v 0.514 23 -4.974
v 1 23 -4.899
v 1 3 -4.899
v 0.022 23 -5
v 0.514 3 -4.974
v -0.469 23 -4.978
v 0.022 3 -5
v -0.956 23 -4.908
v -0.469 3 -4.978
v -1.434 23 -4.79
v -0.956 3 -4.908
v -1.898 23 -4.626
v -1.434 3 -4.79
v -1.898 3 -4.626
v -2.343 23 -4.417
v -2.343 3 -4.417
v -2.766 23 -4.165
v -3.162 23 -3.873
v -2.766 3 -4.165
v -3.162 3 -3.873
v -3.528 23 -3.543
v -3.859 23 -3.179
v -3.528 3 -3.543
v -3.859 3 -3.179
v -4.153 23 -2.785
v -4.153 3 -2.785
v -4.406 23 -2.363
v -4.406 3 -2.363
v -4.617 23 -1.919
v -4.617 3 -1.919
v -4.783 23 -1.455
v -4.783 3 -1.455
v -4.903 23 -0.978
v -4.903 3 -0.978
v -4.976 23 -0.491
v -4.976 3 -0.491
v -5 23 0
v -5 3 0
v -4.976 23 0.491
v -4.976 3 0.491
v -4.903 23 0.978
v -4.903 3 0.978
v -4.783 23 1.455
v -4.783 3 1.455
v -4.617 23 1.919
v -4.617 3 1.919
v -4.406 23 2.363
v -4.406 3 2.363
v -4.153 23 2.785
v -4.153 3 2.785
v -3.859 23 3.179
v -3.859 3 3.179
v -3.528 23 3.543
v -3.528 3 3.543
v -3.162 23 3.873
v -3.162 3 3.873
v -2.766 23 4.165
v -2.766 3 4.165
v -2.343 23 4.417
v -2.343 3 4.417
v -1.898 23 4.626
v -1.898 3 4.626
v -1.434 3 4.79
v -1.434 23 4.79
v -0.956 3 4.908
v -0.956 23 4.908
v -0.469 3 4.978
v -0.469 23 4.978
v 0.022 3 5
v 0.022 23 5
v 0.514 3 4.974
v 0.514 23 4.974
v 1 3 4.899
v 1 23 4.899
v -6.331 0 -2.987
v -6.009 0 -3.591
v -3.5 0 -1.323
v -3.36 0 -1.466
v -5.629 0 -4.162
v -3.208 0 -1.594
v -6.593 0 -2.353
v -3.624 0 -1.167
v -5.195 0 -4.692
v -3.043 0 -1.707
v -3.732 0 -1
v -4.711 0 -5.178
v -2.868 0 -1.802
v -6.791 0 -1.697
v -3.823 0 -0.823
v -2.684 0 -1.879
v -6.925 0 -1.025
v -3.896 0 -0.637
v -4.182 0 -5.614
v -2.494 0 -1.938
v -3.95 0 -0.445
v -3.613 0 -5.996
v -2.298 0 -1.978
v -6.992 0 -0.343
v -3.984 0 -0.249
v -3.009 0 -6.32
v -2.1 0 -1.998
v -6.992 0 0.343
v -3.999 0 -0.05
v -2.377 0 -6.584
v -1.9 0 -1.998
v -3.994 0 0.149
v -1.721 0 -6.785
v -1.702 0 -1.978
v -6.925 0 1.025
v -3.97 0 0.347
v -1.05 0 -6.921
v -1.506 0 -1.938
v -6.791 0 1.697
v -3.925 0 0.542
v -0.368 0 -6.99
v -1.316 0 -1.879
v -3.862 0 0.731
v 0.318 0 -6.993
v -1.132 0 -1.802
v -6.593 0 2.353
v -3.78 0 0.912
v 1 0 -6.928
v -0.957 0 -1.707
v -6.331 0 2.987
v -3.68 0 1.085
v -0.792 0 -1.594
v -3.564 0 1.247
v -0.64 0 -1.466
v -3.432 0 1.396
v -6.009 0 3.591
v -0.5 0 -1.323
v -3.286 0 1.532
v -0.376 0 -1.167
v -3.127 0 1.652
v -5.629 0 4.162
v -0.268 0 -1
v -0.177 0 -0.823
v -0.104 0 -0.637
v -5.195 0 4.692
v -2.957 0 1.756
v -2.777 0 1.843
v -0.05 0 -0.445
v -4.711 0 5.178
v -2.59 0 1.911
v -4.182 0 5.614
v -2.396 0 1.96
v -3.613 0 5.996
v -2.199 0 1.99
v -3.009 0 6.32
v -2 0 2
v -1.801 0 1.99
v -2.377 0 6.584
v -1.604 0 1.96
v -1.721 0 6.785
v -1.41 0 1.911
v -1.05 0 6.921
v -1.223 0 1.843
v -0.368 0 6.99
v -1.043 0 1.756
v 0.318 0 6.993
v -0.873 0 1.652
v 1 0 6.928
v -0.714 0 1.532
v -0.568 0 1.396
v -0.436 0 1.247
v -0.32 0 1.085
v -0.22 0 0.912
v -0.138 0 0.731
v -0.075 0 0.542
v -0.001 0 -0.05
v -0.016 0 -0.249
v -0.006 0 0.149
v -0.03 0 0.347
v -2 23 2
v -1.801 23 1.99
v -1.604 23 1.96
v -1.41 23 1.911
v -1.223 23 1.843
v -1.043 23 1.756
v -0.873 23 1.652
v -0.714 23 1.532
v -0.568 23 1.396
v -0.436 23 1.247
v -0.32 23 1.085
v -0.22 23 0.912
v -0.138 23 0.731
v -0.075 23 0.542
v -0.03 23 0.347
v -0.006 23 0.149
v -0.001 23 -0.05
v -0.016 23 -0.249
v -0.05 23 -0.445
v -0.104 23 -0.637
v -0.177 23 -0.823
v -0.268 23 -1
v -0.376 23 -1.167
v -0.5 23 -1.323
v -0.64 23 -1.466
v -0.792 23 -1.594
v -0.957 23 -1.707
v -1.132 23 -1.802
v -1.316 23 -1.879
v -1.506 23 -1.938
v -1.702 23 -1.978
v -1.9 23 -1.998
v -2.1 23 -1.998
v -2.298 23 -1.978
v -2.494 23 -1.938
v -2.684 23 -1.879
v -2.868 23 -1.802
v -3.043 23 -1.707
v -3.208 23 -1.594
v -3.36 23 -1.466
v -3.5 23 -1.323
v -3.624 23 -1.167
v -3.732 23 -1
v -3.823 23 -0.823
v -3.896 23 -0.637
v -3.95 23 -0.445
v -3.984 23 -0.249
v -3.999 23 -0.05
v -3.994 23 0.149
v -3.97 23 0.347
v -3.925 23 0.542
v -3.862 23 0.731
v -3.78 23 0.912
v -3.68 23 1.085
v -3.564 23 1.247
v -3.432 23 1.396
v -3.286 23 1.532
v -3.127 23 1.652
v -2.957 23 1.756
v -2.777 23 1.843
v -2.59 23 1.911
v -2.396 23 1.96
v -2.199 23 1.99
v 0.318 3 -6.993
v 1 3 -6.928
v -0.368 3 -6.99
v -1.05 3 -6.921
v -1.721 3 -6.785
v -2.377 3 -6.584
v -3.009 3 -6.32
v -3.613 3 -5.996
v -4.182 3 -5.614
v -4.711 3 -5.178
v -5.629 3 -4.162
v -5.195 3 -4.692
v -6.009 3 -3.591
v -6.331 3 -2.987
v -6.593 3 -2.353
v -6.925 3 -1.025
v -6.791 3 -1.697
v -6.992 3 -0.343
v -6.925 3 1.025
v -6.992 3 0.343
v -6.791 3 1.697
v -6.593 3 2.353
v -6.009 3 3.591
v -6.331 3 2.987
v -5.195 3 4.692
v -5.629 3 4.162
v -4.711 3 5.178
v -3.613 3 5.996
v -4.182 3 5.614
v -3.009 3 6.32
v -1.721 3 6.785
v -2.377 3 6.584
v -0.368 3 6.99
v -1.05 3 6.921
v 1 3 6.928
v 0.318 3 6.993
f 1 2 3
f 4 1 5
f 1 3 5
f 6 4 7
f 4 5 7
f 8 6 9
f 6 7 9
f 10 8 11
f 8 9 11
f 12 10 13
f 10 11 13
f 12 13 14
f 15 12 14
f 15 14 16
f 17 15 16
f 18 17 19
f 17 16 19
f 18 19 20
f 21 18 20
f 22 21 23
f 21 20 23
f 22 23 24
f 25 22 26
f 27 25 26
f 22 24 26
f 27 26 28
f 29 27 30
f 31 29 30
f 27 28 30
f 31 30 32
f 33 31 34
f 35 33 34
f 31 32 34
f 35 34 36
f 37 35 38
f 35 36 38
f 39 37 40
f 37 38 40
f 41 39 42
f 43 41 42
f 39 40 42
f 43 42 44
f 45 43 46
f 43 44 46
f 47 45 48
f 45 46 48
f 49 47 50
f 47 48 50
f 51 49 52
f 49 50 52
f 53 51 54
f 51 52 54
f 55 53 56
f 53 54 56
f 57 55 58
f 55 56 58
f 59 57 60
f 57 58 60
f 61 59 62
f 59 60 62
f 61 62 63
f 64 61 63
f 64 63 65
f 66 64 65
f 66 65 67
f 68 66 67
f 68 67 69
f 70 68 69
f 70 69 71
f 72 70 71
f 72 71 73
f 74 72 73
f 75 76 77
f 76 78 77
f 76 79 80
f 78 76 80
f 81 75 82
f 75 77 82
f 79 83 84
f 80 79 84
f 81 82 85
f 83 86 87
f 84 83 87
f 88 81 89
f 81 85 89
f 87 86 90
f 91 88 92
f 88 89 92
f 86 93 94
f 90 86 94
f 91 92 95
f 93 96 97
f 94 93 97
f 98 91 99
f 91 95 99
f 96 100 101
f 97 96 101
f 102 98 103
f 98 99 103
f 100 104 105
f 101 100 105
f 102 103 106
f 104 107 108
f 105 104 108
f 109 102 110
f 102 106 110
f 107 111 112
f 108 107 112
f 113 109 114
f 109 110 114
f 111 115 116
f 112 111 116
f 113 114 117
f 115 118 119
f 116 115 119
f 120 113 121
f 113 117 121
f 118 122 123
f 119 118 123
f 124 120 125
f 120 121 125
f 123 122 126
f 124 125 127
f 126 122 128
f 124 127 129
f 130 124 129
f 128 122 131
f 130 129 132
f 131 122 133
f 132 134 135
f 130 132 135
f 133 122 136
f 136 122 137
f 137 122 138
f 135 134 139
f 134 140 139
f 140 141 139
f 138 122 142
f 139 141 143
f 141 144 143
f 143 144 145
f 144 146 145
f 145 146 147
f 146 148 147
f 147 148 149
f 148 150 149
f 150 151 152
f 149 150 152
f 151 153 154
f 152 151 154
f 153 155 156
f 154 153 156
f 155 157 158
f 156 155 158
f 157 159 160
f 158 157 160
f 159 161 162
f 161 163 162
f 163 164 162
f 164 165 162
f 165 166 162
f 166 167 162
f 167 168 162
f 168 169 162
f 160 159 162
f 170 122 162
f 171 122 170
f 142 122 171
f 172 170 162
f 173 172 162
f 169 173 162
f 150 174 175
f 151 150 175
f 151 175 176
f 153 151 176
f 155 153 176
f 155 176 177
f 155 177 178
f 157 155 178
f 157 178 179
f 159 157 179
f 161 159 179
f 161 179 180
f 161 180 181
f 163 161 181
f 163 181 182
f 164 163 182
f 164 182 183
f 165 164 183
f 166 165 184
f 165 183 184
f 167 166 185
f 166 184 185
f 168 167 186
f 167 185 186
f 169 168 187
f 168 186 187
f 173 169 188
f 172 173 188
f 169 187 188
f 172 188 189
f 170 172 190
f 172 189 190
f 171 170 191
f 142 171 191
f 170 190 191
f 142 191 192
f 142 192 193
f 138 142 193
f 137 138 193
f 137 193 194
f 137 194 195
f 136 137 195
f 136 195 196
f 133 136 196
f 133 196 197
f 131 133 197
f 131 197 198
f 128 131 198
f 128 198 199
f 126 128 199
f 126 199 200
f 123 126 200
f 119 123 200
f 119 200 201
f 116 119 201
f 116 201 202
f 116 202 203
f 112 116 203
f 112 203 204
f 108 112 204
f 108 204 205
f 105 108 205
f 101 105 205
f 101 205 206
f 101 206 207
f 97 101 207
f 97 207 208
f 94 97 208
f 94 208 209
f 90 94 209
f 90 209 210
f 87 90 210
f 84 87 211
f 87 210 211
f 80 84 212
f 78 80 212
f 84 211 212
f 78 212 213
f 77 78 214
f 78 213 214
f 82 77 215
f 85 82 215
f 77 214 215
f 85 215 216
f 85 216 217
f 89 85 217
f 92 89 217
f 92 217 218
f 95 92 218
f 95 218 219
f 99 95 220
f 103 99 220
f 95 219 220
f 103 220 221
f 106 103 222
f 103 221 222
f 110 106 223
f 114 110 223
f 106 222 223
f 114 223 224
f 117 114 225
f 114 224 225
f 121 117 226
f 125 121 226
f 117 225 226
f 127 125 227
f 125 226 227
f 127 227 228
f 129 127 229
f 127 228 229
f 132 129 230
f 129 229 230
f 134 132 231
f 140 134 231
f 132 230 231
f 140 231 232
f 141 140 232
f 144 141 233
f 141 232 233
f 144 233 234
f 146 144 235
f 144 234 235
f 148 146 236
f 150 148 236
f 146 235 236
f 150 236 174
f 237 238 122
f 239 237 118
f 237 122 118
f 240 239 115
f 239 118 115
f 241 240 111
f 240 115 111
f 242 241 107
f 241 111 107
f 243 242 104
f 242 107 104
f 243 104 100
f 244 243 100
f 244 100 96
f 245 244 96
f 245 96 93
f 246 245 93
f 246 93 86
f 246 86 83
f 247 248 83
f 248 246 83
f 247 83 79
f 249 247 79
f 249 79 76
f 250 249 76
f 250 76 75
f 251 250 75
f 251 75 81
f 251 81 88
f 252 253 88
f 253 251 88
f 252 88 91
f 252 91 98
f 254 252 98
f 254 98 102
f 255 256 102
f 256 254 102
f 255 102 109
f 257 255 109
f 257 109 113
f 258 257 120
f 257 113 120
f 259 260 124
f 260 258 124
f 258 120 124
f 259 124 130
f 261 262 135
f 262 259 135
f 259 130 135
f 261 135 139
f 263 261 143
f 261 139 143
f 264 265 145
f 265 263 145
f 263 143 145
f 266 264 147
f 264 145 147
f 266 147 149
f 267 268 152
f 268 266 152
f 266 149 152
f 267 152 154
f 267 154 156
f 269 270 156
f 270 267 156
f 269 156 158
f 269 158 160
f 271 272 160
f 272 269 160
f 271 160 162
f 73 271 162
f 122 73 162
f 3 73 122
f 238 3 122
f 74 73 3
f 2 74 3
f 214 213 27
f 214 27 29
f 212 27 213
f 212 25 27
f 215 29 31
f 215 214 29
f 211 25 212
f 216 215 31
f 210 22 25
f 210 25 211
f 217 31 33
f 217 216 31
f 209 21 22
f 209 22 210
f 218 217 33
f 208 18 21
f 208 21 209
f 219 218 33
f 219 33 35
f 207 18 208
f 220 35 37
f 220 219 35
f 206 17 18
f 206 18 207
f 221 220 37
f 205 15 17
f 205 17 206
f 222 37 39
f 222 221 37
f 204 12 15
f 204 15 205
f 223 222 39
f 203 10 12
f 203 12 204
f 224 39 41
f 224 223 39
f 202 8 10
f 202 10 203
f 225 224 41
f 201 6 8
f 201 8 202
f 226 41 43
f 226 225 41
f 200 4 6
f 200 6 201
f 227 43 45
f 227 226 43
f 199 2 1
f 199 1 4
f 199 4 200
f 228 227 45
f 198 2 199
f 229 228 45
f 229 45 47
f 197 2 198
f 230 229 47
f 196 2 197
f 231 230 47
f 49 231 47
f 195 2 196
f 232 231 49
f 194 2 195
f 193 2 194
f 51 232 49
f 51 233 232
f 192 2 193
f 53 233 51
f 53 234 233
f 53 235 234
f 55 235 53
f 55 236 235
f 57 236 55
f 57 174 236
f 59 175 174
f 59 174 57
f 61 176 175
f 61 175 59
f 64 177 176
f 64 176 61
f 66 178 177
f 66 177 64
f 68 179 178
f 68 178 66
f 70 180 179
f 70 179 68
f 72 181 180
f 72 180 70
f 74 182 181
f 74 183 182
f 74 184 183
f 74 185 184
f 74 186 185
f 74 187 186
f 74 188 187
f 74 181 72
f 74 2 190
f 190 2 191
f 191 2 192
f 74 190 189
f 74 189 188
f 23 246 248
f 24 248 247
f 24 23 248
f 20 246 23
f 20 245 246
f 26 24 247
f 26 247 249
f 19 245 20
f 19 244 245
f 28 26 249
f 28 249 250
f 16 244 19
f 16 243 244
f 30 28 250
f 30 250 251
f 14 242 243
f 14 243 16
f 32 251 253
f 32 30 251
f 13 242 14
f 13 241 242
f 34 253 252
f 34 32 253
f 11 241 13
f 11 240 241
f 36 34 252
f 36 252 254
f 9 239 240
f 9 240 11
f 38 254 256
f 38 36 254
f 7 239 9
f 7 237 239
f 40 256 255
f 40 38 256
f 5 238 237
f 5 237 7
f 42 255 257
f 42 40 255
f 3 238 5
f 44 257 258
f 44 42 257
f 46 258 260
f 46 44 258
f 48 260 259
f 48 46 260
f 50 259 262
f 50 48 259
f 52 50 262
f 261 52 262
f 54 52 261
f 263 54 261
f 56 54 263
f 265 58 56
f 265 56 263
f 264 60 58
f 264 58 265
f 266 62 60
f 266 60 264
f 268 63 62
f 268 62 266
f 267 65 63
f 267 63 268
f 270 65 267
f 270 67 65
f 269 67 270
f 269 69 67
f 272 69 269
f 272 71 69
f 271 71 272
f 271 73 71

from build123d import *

# Parameters (mm, degrees)
SKETCH_1_R          = 7
EXTRUDE_1_DEPTH     = 3
SKETCH_2_R          = 5
EXTRUDE_2_DEPTH     = 20
SKETCH_3_R          = 2
CUT_EXTRUDE_1_DEPTH = 26.039968051
SKETCH_4_W          = 8.616079813
SKETCH_4_H          = 14.040723598
CUT_EXTRUDE_2_DEPTH = 26.039968051


with BuildPart() as part:
    # 草图1 → 凸台-拉伸1 (new body)
    with BuildSketch(Plane(origin=(0, 0, 0), x_dir=(1, 0, 0), z_dir=(0, 1, 0))):
        with Locations(Location((0, 0, 0), (0, 0, 270))):
            Circle(SKETCH_1_R)
    extrude(amount=EXTRUDE_1_DEPTH)

    # 草图2 → 凸台-拉伸2 (add)
    with BuildSketch(Plane(origin=(0, 3, 0), x_dir=(1, 0, 0), z_dir=(0, 1, 0))):
        with Locations(Location((0, 0, 0), (0, 0, 270))):
            Circle(SKETCH_2_R)
    extrude(amount=EXTRUDE_2_DEPTH)

    # 草图3 → 切除-拉伸1 (cut, through all)
    with BuildSketch(Plane(origin=(0, 23, 0), x_dir=(1, 0, 0), z_dir=(0, 1, 0))):
        with Locations(Location((-2, 0, 0), (0, 0, 270))):
            Circle(SKETCH_3_R)
    extrude(amount=-CUT_EXTRUDE_1_DEPTH, mode=Mode.SUBTRACT)

    # 草图4 → 切除-拉伸2 (cut, through all)
    with BuildSketch(Plane(origin=(0, 23, 0), x_dir=(1, 0, 0), z_dir=(0, 1, 0))):
        with Locations((5.308039907, -0.092158569)):
            Rectangle(SKETCH_4_W, SKETCH_4_H)
    extrude(amount=-CUT_EXTRUDE_2_DEPTH, mode=Mode.SUBTRACT)


solid = part.part
